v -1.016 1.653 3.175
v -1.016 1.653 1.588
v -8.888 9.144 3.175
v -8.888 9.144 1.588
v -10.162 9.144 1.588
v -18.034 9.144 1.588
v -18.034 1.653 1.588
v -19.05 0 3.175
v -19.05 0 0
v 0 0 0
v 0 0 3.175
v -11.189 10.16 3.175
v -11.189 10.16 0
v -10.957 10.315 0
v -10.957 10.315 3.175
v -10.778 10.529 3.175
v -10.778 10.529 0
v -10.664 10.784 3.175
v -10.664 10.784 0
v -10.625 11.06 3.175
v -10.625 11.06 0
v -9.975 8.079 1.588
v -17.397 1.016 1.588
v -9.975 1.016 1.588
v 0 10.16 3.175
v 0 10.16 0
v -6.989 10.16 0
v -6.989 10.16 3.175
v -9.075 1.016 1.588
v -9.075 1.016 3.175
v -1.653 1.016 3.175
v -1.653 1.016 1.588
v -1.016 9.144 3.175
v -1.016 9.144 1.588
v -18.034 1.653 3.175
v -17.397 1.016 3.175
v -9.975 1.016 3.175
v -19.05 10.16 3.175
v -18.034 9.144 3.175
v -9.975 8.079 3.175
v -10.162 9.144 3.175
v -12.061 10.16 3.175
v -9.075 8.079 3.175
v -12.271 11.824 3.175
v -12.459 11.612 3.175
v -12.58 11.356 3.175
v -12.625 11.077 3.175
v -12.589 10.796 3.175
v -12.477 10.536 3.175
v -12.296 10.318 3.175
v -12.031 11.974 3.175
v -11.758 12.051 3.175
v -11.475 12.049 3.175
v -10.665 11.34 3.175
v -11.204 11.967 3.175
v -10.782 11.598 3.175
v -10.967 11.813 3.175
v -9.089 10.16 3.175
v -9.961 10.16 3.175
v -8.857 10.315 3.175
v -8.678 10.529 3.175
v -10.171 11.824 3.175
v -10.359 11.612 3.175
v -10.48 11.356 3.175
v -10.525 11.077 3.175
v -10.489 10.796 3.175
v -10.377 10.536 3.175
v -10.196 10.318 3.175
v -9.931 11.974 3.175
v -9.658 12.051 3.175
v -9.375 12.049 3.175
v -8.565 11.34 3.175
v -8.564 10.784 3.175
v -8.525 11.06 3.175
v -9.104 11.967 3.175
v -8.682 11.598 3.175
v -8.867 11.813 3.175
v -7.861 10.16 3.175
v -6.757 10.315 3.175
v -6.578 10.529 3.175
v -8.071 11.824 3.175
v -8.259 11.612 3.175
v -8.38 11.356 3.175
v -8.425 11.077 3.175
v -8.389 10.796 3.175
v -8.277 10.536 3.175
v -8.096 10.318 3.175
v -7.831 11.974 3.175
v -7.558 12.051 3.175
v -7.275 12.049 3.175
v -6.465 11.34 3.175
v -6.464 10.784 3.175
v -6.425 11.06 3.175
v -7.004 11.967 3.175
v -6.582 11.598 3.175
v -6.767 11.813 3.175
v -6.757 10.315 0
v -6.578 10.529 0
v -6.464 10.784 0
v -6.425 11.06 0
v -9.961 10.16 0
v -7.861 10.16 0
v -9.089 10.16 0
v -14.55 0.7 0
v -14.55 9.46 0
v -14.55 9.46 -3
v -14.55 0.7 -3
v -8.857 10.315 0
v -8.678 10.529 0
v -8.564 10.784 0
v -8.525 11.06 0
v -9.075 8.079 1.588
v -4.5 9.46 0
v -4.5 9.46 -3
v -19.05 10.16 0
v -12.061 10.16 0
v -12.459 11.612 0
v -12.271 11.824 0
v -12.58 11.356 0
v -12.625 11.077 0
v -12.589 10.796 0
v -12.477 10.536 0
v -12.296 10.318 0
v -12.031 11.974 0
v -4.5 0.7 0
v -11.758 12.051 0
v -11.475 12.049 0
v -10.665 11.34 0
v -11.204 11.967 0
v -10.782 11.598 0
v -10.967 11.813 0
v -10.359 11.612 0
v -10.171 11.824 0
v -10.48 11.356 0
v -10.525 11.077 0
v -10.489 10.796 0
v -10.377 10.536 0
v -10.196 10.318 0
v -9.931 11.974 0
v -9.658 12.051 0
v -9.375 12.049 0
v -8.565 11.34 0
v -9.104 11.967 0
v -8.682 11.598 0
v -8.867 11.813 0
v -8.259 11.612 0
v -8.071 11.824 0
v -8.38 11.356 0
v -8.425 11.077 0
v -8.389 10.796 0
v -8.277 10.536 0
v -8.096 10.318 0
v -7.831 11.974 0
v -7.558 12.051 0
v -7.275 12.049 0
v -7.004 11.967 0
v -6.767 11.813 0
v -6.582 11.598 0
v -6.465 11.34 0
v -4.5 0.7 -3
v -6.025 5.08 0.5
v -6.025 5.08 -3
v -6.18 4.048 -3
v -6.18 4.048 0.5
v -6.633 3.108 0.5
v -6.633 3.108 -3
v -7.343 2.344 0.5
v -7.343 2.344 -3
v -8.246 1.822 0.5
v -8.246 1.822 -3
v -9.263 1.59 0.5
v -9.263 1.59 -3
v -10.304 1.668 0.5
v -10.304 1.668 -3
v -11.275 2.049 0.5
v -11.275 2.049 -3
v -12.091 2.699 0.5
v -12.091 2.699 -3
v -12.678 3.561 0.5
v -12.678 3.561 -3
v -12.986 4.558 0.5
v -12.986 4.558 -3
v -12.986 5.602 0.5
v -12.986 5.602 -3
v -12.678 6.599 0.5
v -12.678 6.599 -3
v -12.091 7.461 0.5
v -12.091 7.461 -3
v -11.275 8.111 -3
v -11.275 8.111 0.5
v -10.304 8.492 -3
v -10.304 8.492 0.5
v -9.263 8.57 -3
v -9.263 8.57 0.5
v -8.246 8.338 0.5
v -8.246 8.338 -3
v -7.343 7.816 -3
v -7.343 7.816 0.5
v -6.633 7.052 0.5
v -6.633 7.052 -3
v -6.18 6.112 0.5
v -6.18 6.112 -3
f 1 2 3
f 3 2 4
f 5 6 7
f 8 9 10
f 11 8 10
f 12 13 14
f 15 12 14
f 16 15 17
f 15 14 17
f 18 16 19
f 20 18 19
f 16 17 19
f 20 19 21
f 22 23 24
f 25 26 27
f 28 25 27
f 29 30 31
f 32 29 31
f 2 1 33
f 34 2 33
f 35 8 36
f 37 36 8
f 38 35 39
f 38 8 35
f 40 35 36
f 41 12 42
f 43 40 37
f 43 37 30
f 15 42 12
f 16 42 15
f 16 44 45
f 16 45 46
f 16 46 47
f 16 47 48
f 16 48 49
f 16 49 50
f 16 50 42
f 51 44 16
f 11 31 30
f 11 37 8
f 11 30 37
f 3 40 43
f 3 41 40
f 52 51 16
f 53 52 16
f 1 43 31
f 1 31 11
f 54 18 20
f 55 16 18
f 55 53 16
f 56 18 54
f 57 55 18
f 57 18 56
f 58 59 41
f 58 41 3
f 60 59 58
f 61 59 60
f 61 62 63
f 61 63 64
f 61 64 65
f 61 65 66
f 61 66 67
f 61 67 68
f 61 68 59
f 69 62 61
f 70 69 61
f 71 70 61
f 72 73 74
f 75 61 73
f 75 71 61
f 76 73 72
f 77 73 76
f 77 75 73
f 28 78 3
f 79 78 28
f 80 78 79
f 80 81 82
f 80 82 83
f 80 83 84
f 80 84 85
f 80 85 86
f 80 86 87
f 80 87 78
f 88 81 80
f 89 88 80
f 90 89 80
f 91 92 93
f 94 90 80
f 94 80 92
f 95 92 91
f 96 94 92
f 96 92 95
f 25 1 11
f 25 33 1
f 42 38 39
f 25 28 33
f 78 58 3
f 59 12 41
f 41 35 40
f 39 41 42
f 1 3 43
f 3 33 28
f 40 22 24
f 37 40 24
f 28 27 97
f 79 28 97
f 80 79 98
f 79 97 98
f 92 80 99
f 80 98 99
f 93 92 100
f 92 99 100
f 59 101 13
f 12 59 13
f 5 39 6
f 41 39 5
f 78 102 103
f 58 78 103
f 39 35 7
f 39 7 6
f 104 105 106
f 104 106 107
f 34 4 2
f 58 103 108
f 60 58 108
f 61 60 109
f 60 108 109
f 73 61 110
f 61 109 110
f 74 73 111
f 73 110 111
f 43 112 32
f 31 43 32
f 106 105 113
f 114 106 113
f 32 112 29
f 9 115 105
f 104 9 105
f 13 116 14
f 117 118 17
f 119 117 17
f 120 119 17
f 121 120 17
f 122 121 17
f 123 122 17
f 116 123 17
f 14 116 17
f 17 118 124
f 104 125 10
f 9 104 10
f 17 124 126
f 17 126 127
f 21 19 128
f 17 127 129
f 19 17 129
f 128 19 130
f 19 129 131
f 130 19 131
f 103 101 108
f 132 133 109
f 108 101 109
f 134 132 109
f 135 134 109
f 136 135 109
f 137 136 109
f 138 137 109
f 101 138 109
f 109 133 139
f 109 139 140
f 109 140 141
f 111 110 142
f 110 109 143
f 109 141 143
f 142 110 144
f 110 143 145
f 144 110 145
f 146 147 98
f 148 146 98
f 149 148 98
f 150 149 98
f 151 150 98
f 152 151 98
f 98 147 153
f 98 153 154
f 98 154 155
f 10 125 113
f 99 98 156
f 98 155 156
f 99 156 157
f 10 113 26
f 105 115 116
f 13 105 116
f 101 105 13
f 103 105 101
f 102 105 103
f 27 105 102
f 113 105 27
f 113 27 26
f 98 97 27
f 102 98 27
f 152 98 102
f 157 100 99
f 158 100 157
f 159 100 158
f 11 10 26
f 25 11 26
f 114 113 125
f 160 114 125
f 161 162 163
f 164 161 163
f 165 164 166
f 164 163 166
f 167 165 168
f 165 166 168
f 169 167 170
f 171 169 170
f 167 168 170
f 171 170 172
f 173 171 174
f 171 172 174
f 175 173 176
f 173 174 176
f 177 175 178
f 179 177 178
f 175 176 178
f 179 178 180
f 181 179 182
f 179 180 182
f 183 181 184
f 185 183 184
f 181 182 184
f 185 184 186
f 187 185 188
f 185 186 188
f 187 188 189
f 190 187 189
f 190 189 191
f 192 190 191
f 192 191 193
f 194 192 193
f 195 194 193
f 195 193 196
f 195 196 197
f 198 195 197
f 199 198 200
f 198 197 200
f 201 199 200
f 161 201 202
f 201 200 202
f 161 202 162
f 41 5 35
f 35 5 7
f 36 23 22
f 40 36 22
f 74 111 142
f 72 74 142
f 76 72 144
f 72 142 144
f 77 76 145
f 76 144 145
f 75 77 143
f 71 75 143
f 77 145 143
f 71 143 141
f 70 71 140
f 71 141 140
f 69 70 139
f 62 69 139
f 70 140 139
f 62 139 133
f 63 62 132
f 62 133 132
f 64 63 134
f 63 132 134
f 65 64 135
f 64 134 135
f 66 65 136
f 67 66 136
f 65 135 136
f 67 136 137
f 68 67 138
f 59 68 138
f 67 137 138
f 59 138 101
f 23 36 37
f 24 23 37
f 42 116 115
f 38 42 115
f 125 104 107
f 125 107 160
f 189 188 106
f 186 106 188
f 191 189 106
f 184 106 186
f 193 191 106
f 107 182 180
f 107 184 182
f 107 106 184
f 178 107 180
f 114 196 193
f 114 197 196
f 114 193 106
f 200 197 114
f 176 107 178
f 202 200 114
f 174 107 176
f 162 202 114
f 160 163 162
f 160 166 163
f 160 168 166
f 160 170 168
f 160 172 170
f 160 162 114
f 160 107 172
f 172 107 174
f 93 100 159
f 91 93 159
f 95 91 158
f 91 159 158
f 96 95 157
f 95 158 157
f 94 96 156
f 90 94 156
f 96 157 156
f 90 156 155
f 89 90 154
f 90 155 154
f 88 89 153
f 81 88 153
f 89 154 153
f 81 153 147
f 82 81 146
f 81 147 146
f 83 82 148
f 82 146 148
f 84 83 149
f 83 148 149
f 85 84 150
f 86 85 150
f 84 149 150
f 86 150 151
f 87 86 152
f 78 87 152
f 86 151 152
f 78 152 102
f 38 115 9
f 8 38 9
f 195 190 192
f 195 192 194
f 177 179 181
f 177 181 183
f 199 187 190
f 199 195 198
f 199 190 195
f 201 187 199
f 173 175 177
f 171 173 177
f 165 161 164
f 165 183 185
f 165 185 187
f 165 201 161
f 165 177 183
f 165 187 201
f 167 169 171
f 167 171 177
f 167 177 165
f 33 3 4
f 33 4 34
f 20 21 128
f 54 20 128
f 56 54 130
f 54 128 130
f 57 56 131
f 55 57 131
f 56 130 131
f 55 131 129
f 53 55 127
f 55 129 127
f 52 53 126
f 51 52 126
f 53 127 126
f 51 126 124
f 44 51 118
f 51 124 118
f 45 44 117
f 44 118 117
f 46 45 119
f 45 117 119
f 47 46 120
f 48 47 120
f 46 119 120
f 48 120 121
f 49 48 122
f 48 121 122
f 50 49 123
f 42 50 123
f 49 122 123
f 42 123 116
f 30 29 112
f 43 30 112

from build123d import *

# Parameters (mm, degrees)
F1_DEPTH  = 3.175
F2_W      = 17.018
F2_H      = 8.128
F3_DEPTH  = 1.5875
F5_DEPTH  = 1.5875
F6_W      = 10.05
F6_H      = 8.76
F7_DEPTH  = 3
F8_R      = 3.5
F9_DEPTH  = 3.5
F11_DEPTH = 1.5875


with BuildPart() as f1:
    # F0 (on Top) → F1 (new body)
    with BuildSketch(Plane.XY):
        with BuildLine():
            Line((-12.0608898944, 10.16), (-19.05, 10.16))
            Line((-19.05, 10.16), (-19.05, 0))
            Line((-19.05, 0), (0, 0))
            Line((0, 0), (0, 10.16))
            Line((0, 10.16), (-6.9891101056, 10.16))
            ThreePointArc((-6.9891101056, 10.16), (-7.425, 10.06), (-7.8608898944, 10.16))
            Line((-7.8608898944, 10.16), (-9.0891101056, 10.16))
            ThreePointArc((-9.0891101056, 10.16), (-9.525, 10.06), (-9.9608898944, 10.16))
            Line((-9.9608898944, 10.16), (-11.1891101056, 10.16))
            ThreePointArc((-11.1891101056, 10.16), (-11.625, 10.06), (-12.0608898944, 10.16))
        make_face()
        with BuildLine():
            ThreePointArc((-10.625, 11.06), (-12.1560885546, 11.9073163206), (-12.0608898944, 10.16))
            Line((-12.0608898944, 10.16), (-11.1891101056, 10.16))
            ThreePointArc((-11.1891101056, 10.16), (-10.7776836794, 10.5289114454), (-10.625, 11.06))
        make_face()
        with BuildLine():
            Line((-11.1891101056, 10.16), (-12.0608898944, 10.16))
            ThreePointArc((-12.0608898944, 10.16), (-11.625, 10.06), (-11.1891101056, 10.16))
        make_face()
        with BuildLine():
            ThreePointArc((-8.525, 11.06), (-10.0560885546, 11.9073163206), (-9.9608898944, 10.16))
            Line((-9.9608898944, 10.16), (-9.0891101056, 10.16))
            ThreePointArc((-9.0891101056, 10.16), (-8.6776836794, 10.5289114454), (-8.525, 11.06))
        make_face()
        with BuildLine():
            Line((-9.0891101056, 10.16), (-9.9608898944, 10.16))
            ThreePointArc((-9.9608898944, 10.16), (-9.525, 10.06), (-9.0891101056, 10.16))
        make_face()
        with BuildLine():
            ThreePointArc((-7.8608898944, 10.16), (-7.425, 10.06), (-6.9891101056, 10.16))
            Line((-6.9891101056, 10.16), (-7.8608898944, 10.16))
        make_face()
        with BuildLine():
            Line((-7.8608898944, 10.16), (-6.9891101056, 10.16))
            ThreePointArc((-6.9891101056, 10.16), (-6.5776836794, 10.5289114454), (-6.425, 11.06))
            ThreePointArc((-6.425, 11.06), (-7.9560885546, 11.9073163206), (-7.8608898944, 10.16))
        make_face()
    extrude(amount=F1_DEPTH)

    # F2 (on face) → F3 (cut)
    with BuildSketch(Plane.XY.offset(3.175)):
        with Locations((-9.525, 5.08)):
            Rectangle(F2_W, F2_H)
    extrude(amount=-F3_DEPTH, mode=Mode.SUBTRACT)

    # F4 (on face) → F5 (join, through all)
    with BuildSketch(Plane.XY.offset(1.5875)):
        Polygon((-9.525, 8.5074082457), (-9.525, 9.144), (-10.1615917543, 9.144), (-18.034, 1.6525917543), (-18.034, 1.016), (-17.3974082457, 1.016), (-9.825, 8.2219273099), align=None)
        Polygon((-8.8884082457, 9.144), (-9.525, 9.144), (-9.525, 8.5074082457), (-9.225, 8.2219273099), (-1.6525917543, 1.016), (-1.016, 1.016), (-1.016, 1.6525917543), align=None)
    extrude(amount=F5_DEPTH)

    # F6 (on face) → F7 (join)
    with BuildSketch(Plane(origin=(0, 0, 0), x_dir=(1, 0, 0), z_dir=(0, 0, -1))):
        with Locations((-9.525, -5.08)):
            Rectangle(F6_W, F6_H)
    extrude(amount=F7_DEPTH)

    # F8 (on face) → F9 (cut)
    with BuildSketch(Plane(origin=(0, 0, -3), x_dir=(1, 0, 0), z_dir=(0, 0, -1))):
        with Locations((-9.525, -5.08)):
            Circle(F8_R)
    extrude(amount=-F9_DEPTH, mode=Mode.SUBTRACT)

    # F10 (on face) → F11 (join, through all)
    with BuildSketch(Plane.XY.offset(1.5875)):
        Polygon((-9.525, 8.5074082457), (-9.975, 8.0791868419), (-9.975, 1.016), (-9.525, 1.016), (-9.075, 1.016), (-9.075, 8.0791868419), align=None)
    extrude(amount=F11_DEPTH)


solid = f1.part
